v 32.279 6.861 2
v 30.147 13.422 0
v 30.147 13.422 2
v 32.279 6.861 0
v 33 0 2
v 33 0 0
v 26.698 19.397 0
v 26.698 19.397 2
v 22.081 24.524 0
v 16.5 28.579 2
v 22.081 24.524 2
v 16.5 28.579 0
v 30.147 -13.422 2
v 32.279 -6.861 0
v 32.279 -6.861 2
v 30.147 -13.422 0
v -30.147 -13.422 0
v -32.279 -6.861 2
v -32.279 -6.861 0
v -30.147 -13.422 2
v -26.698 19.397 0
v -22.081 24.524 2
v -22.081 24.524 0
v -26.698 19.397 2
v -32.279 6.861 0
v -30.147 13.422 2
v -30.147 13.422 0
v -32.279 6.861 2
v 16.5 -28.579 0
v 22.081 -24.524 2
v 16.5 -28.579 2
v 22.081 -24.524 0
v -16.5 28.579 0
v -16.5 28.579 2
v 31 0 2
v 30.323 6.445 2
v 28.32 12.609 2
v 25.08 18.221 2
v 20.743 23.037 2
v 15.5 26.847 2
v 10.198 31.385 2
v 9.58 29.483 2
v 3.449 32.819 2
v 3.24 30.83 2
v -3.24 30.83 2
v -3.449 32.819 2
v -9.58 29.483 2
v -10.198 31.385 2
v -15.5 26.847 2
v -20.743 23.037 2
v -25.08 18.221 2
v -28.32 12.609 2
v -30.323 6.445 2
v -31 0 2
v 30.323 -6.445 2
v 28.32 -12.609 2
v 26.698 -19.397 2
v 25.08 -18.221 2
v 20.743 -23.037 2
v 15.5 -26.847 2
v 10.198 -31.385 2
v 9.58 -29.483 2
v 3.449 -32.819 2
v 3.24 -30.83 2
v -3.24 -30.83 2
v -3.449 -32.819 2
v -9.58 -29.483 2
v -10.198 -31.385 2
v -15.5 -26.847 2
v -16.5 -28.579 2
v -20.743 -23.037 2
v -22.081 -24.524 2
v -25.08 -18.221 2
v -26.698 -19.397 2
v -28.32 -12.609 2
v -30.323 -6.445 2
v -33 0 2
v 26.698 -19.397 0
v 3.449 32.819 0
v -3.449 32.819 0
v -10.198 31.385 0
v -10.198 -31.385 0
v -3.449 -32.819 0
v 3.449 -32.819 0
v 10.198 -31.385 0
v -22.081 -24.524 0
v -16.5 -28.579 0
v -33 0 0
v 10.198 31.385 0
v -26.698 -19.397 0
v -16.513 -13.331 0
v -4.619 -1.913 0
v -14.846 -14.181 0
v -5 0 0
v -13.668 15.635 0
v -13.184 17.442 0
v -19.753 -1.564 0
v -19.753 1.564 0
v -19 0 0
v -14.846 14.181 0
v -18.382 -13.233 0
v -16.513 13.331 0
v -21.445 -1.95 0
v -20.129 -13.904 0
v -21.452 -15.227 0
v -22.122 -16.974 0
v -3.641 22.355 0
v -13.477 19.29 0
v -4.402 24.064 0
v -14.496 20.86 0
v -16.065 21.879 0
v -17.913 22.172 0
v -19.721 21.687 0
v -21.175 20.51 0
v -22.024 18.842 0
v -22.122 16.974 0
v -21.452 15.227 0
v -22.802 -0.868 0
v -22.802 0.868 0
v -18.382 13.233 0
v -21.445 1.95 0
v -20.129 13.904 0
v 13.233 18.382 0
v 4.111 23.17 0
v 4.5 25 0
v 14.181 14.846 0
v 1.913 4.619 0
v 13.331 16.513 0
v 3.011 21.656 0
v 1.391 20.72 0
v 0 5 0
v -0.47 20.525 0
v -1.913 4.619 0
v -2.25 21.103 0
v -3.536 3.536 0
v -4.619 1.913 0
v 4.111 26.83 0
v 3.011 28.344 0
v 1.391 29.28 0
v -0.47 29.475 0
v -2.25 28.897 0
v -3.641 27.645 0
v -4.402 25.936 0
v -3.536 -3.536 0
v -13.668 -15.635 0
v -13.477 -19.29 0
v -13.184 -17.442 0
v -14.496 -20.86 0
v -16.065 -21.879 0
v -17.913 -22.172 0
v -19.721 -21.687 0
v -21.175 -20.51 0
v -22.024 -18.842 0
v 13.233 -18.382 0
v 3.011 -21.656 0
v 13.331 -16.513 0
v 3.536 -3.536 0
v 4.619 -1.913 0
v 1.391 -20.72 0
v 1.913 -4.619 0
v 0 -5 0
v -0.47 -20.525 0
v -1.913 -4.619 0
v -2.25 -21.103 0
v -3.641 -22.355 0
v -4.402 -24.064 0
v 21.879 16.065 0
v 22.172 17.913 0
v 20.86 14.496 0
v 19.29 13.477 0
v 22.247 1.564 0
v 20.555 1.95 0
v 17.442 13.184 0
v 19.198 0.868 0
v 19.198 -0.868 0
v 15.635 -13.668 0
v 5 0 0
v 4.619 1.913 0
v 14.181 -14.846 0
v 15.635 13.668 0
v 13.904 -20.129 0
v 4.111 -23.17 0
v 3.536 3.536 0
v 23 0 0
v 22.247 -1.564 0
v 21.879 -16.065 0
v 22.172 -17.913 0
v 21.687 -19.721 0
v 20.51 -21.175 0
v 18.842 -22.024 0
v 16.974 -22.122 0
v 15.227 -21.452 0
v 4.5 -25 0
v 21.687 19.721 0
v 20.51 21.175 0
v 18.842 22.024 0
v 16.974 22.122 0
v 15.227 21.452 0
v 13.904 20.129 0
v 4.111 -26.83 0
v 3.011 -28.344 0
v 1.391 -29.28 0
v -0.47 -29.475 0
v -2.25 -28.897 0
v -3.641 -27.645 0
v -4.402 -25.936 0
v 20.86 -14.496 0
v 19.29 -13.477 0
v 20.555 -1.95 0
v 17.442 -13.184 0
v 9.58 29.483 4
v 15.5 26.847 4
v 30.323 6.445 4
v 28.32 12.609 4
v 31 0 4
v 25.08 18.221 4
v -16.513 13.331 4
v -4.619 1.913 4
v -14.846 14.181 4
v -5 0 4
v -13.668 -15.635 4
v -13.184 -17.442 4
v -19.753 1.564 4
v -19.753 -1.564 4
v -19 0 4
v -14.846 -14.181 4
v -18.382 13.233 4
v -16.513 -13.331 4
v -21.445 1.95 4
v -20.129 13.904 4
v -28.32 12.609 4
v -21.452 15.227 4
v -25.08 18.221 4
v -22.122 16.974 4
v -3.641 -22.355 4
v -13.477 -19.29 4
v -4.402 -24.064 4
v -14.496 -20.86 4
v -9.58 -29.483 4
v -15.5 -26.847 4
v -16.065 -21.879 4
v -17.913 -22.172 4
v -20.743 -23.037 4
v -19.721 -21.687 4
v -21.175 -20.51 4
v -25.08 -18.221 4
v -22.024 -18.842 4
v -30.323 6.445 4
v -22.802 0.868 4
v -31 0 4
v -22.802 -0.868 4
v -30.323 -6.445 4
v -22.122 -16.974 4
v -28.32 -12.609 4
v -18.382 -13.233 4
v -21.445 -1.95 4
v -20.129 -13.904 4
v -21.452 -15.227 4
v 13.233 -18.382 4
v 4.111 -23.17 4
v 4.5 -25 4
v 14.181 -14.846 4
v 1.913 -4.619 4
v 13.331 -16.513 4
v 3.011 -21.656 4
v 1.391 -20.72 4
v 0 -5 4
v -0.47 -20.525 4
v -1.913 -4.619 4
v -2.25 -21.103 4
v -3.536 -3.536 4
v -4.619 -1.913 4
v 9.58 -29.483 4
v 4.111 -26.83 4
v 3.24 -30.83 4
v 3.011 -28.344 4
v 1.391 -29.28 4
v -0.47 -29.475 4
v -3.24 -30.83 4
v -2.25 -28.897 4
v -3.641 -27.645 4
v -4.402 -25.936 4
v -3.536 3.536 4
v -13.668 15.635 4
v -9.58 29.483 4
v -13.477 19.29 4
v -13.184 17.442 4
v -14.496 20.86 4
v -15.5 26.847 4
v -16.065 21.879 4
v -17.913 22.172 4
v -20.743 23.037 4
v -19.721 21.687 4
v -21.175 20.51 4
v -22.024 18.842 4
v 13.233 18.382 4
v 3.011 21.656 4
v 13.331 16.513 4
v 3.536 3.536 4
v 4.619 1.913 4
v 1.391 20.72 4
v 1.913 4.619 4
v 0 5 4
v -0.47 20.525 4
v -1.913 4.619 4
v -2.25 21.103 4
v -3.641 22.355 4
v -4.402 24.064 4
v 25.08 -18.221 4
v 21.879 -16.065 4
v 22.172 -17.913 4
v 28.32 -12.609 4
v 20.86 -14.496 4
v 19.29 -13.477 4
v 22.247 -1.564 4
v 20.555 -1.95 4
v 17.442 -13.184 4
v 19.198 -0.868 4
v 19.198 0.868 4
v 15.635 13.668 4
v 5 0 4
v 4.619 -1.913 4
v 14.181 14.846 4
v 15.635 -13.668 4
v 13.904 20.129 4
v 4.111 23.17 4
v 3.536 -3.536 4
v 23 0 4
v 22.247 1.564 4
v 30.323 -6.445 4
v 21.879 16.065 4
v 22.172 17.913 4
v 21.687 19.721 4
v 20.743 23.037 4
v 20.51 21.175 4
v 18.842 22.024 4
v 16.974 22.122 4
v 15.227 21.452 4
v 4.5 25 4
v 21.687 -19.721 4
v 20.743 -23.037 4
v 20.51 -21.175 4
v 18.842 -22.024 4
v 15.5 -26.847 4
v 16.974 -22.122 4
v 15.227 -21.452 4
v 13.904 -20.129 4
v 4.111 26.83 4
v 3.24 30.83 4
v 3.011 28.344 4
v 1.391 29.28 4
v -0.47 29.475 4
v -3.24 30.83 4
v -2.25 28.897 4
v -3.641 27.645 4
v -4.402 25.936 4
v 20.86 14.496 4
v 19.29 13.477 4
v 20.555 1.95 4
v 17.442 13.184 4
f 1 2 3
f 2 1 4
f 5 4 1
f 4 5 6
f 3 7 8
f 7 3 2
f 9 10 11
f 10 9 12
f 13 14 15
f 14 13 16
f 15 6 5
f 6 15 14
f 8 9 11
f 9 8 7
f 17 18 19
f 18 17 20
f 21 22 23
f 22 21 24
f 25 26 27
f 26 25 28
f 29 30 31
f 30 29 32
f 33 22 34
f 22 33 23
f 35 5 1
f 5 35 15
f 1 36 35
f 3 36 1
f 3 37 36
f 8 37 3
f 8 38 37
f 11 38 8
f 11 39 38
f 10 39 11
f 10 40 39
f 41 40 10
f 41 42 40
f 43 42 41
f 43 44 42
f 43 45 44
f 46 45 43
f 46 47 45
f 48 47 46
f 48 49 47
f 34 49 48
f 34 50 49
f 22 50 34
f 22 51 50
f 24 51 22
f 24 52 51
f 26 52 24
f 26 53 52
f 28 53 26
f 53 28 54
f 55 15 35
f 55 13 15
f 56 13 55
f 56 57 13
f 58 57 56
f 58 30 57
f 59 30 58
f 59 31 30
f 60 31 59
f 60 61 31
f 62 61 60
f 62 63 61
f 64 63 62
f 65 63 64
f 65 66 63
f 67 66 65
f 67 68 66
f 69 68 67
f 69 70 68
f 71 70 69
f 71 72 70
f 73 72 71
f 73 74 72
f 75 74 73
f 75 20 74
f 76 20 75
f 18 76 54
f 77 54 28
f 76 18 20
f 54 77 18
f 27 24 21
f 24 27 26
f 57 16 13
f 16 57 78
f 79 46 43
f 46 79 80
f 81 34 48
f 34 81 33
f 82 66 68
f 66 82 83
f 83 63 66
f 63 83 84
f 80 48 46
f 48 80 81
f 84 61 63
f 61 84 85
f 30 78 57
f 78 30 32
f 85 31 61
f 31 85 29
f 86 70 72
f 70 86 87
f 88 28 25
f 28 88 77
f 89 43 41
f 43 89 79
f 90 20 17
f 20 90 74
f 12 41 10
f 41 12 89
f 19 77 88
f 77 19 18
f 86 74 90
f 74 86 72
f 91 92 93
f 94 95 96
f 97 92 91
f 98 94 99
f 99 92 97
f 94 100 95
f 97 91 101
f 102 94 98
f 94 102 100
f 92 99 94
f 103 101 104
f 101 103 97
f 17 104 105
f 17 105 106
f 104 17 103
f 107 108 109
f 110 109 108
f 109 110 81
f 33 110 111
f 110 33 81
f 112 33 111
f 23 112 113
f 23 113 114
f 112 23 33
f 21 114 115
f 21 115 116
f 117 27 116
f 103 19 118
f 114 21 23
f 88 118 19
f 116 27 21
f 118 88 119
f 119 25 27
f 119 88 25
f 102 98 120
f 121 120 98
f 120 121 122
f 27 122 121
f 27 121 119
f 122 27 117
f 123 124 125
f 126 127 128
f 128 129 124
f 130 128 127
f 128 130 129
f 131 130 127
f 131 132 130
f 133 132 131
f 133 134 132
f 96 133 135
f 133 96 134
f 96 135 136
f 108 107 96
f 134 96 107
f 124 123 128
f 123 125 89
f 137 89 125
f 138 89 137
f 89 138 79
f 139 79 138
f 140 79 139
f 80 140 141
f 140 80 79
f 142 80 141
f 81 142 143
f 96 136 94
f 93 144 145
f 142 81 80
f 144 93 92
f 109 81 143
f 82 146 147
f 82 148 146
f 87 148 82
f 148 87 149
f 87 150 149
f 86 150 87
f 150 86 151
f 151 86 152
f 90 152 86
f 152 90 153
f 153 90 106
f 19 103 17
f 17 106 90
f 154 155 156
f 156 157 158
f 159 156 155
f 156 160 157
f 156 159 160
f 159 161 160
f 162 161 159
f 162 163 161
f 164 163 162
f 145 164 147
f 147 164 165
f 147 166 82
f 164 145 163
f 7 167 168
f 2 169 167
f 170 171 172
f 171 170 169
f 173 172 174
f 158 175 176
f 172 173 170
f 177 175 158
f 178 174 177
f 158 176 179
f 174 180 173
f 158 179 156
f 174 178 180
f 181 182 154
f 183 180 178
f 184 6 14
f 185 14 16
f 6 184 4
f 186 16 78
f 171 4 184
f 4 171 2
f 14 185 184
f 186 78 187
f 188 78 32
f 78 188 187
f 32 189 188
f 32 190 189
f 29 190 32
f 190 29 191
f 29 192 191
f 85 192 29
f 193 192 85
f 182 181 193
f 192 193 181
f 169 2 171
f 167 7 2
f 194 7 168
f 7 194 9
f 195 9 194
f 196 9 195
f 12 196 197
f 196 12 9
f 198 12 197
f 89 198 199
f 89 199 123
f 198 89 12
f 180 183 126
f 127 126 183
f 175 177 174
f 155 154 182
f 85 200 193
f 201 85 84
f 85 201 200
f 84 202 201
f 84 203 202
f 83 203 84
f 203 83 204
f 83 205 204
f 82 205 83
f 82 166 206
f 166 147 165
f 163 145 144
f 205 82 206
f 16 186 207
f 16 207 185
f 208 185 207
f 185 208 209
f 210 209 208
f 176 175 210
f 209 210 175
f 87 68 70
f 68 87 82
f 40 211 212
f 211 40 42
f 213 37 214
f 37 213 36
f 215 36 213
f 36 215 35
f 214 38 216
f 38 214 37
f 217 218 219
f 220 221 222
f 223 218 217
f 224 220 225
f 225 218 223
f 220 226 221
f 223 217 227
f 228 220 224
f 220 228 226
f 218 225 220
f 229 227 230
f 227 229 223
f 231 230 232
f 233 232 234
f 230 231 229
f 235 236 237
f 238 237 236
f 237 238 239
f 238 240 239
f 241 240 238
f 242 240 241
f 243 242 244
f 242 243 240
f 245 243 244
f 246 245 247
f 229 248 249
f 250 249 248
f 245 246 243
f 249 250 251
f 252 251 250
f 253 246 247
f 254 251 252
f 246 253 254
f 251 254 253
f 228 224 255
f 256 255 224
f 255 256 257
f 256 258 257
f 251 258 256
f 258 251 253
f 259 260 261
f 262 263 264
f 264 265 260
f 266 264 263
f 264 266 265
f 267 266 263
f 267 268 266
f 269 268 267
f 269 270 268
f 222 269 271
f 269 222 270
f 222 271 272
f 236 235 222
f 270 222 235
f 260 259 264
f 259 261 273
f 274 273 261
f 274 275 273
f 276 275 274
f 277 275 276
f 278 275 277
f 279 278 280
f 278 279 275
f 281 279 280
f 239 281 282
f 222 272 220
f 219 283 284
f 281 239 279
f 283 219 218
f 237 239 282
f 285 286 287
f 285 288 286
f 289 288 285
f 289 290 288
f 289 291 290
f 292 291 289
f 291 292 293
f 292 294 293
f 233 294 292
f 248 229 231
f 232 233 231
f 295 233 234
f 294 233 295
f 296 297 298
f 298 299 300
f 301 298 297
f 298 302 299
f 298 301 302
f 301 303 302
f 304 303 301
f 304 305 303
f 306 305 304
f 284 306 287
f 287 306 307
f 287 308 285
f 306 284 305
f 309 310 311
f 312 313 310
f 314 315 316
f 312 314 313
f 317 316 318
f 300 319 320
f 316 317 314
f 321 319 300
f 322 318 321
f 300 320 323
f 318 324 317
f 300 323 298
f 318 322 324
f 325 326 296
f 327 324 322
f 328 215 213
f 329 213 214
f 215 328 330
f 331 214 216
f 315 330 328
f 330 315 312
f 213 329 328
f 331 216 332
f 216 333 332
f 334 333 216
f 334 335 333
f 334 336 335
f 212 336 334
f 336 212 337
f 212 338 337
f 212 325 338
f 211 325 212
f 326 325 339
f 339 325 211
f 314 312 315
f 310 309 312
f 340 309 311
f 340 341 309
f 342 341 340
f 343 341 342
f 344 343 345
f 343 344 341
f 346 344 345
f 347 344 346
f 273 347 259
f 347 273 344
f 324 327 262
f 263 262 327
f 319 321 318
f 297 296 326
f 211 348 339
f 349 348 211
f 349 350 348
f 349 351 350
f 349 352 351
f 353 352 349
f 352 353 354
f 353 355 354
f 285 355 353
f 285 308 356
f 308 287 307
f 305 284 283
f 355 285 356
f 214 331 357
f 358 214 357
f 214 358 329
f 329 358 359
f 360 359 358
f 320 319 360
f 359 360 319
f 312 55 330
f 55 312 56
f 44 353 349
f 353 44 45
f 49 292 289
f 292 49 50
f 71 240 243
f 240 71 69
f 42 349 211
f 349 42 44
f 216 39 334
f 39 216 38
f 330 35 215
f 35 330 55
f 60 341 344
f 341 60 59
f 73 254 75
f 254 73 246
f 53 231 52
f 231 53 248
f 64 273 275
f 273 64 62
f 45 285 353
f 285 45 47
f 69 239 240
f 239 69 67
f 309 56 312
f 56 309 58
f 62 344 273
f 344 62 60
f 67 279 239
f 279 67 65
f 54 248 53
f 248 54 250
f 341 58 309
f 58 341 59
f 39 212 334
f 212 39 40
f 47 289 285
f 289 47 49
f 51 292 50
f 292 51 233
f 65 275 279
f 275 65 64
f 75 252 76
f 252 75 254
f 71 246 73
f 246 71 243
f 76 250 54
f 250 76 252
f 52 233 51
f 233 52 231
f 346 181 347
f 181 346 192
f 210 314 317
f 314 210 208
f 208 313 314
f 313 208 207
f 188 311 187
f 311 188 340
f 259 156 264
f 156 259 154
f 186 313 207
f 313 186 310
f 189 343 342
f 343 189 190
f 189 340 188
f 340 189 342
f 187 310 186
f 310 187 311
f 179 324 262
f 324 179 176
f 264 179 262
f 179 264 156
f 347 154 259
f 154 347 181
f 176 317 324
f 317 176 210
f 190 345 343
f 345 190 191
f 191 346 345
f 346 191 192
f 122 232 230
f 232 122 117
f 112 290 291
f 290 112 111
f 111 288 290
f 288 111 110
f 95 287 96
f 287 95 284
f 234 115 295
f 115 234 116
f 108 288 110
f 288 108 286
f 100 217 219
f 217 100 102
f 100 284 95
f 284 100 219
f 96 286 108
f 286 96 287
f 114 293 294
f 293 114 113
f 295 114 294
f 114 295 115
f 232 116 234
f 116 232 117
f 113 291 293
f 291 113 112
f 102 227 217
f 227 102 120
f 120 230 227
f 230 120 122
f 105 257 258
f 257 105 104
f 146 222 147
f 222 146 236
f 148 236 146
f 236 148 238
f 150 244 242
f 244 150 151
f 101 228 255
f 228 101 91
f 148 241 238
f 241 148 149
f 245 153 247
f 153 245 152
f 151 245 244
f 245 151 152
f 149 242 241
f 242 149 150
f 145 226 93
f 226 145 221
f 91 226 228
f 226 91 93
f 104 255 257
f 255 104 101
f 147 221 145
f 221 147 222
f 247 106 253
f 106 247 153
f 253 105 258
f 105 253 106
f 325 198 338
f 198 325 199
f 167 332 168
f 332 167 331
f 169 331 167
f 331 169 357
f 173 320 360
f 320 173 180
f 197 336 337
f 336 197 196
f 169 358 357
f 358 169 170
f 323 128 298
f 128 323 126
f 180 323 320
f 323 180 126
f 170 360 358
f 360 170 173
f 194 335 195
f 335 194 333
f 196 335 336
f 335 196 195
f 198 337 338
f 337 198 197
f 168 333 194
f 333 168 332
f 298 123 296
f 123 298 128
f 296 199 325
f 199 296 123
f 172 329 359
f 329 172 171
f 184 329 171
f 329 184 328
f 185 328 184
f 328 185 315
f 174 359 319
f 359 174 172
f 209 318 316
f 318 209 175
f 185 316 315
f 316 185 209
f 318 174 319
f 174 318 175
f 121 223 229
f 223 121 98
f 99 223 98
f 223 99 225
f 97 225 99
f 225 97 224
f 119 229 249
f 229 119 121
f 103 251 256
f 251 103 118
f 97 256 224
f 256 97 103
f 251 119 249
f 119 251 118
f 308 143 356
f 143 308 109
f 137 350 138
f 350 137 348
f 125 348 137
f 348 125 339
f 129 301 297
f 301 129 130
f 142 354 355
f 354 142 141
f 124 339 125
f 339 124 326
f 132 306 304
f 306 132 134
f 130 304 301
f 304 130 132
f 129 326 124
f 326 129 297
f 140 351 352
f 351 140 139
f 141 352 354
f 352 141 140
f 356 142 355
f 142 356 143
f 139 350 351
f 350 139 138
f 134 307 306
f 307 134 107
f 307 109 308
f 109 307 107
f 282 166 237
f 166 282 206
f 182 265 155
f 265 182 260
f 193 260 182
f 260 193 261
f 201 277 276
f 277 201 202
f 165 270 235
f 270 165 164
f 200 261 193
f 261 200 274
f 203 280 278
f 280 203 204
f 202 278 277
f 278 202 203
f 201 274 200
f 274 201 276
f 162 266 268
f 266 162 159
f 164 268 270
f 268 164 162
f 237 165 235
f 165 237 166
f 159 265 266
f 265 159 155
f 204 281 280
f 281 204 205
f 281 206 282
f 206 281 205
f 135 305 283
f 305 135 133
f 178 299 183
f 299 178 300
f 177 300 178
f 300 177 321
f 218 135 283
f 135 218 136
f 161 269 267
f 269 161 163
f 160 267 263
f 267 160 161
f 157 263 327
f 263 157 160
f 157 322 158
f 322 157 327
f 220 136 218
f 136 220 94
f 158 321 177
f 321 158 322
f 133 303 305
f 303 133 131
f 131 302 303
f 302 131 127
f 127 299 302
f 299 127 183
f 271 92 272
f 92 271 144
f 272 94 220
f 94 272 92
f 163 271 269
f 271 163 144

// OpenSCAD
difference() {
        
    union () {
        cylinder(2,33,33); //grundplatte
        translate ([0,0,2]) {
            cylinder (2,31,31); //abschlussplatte
        }
    }
        translate ([21,0,-0.5]) {
            cylinder(6,2,2);  //stangenloch
        }
        translate ([-21,0,-0.5]) {
            cylinder(6,2,2);  //stangenloch
        }
        translate ([0,25,-0.5]) {
            cylinder(6,4.5,4.5); //luftloch
        }
        translate ([0,-25,-0.5]) {
            cylinder(6,4.5,4.5);//luftloch
        }
        rotate (45,0,0) {
            translate ([0,-25,-0.5]) {
                cylinder(6,4.5,4.5);//luftloch
            }
            translate ([0,25,-0.5]) {
                cylinder(6,4.5,4.5);//luftloch
            }
        }
        rotate (-45,0,0) {
            translate ([0,-25,-0.5]) {
                cylinder(6,4.5,4.5);//luftloch
            }
            translate ([0,25,-0.5]) {
                cylinder(6,4.5,4.5);//luftloch
            }
        }
        translate([0,0,-0.5]){
            cylinder(6,5,5); //staubsensorloch
        }
    }
// bodenscheibe
    
